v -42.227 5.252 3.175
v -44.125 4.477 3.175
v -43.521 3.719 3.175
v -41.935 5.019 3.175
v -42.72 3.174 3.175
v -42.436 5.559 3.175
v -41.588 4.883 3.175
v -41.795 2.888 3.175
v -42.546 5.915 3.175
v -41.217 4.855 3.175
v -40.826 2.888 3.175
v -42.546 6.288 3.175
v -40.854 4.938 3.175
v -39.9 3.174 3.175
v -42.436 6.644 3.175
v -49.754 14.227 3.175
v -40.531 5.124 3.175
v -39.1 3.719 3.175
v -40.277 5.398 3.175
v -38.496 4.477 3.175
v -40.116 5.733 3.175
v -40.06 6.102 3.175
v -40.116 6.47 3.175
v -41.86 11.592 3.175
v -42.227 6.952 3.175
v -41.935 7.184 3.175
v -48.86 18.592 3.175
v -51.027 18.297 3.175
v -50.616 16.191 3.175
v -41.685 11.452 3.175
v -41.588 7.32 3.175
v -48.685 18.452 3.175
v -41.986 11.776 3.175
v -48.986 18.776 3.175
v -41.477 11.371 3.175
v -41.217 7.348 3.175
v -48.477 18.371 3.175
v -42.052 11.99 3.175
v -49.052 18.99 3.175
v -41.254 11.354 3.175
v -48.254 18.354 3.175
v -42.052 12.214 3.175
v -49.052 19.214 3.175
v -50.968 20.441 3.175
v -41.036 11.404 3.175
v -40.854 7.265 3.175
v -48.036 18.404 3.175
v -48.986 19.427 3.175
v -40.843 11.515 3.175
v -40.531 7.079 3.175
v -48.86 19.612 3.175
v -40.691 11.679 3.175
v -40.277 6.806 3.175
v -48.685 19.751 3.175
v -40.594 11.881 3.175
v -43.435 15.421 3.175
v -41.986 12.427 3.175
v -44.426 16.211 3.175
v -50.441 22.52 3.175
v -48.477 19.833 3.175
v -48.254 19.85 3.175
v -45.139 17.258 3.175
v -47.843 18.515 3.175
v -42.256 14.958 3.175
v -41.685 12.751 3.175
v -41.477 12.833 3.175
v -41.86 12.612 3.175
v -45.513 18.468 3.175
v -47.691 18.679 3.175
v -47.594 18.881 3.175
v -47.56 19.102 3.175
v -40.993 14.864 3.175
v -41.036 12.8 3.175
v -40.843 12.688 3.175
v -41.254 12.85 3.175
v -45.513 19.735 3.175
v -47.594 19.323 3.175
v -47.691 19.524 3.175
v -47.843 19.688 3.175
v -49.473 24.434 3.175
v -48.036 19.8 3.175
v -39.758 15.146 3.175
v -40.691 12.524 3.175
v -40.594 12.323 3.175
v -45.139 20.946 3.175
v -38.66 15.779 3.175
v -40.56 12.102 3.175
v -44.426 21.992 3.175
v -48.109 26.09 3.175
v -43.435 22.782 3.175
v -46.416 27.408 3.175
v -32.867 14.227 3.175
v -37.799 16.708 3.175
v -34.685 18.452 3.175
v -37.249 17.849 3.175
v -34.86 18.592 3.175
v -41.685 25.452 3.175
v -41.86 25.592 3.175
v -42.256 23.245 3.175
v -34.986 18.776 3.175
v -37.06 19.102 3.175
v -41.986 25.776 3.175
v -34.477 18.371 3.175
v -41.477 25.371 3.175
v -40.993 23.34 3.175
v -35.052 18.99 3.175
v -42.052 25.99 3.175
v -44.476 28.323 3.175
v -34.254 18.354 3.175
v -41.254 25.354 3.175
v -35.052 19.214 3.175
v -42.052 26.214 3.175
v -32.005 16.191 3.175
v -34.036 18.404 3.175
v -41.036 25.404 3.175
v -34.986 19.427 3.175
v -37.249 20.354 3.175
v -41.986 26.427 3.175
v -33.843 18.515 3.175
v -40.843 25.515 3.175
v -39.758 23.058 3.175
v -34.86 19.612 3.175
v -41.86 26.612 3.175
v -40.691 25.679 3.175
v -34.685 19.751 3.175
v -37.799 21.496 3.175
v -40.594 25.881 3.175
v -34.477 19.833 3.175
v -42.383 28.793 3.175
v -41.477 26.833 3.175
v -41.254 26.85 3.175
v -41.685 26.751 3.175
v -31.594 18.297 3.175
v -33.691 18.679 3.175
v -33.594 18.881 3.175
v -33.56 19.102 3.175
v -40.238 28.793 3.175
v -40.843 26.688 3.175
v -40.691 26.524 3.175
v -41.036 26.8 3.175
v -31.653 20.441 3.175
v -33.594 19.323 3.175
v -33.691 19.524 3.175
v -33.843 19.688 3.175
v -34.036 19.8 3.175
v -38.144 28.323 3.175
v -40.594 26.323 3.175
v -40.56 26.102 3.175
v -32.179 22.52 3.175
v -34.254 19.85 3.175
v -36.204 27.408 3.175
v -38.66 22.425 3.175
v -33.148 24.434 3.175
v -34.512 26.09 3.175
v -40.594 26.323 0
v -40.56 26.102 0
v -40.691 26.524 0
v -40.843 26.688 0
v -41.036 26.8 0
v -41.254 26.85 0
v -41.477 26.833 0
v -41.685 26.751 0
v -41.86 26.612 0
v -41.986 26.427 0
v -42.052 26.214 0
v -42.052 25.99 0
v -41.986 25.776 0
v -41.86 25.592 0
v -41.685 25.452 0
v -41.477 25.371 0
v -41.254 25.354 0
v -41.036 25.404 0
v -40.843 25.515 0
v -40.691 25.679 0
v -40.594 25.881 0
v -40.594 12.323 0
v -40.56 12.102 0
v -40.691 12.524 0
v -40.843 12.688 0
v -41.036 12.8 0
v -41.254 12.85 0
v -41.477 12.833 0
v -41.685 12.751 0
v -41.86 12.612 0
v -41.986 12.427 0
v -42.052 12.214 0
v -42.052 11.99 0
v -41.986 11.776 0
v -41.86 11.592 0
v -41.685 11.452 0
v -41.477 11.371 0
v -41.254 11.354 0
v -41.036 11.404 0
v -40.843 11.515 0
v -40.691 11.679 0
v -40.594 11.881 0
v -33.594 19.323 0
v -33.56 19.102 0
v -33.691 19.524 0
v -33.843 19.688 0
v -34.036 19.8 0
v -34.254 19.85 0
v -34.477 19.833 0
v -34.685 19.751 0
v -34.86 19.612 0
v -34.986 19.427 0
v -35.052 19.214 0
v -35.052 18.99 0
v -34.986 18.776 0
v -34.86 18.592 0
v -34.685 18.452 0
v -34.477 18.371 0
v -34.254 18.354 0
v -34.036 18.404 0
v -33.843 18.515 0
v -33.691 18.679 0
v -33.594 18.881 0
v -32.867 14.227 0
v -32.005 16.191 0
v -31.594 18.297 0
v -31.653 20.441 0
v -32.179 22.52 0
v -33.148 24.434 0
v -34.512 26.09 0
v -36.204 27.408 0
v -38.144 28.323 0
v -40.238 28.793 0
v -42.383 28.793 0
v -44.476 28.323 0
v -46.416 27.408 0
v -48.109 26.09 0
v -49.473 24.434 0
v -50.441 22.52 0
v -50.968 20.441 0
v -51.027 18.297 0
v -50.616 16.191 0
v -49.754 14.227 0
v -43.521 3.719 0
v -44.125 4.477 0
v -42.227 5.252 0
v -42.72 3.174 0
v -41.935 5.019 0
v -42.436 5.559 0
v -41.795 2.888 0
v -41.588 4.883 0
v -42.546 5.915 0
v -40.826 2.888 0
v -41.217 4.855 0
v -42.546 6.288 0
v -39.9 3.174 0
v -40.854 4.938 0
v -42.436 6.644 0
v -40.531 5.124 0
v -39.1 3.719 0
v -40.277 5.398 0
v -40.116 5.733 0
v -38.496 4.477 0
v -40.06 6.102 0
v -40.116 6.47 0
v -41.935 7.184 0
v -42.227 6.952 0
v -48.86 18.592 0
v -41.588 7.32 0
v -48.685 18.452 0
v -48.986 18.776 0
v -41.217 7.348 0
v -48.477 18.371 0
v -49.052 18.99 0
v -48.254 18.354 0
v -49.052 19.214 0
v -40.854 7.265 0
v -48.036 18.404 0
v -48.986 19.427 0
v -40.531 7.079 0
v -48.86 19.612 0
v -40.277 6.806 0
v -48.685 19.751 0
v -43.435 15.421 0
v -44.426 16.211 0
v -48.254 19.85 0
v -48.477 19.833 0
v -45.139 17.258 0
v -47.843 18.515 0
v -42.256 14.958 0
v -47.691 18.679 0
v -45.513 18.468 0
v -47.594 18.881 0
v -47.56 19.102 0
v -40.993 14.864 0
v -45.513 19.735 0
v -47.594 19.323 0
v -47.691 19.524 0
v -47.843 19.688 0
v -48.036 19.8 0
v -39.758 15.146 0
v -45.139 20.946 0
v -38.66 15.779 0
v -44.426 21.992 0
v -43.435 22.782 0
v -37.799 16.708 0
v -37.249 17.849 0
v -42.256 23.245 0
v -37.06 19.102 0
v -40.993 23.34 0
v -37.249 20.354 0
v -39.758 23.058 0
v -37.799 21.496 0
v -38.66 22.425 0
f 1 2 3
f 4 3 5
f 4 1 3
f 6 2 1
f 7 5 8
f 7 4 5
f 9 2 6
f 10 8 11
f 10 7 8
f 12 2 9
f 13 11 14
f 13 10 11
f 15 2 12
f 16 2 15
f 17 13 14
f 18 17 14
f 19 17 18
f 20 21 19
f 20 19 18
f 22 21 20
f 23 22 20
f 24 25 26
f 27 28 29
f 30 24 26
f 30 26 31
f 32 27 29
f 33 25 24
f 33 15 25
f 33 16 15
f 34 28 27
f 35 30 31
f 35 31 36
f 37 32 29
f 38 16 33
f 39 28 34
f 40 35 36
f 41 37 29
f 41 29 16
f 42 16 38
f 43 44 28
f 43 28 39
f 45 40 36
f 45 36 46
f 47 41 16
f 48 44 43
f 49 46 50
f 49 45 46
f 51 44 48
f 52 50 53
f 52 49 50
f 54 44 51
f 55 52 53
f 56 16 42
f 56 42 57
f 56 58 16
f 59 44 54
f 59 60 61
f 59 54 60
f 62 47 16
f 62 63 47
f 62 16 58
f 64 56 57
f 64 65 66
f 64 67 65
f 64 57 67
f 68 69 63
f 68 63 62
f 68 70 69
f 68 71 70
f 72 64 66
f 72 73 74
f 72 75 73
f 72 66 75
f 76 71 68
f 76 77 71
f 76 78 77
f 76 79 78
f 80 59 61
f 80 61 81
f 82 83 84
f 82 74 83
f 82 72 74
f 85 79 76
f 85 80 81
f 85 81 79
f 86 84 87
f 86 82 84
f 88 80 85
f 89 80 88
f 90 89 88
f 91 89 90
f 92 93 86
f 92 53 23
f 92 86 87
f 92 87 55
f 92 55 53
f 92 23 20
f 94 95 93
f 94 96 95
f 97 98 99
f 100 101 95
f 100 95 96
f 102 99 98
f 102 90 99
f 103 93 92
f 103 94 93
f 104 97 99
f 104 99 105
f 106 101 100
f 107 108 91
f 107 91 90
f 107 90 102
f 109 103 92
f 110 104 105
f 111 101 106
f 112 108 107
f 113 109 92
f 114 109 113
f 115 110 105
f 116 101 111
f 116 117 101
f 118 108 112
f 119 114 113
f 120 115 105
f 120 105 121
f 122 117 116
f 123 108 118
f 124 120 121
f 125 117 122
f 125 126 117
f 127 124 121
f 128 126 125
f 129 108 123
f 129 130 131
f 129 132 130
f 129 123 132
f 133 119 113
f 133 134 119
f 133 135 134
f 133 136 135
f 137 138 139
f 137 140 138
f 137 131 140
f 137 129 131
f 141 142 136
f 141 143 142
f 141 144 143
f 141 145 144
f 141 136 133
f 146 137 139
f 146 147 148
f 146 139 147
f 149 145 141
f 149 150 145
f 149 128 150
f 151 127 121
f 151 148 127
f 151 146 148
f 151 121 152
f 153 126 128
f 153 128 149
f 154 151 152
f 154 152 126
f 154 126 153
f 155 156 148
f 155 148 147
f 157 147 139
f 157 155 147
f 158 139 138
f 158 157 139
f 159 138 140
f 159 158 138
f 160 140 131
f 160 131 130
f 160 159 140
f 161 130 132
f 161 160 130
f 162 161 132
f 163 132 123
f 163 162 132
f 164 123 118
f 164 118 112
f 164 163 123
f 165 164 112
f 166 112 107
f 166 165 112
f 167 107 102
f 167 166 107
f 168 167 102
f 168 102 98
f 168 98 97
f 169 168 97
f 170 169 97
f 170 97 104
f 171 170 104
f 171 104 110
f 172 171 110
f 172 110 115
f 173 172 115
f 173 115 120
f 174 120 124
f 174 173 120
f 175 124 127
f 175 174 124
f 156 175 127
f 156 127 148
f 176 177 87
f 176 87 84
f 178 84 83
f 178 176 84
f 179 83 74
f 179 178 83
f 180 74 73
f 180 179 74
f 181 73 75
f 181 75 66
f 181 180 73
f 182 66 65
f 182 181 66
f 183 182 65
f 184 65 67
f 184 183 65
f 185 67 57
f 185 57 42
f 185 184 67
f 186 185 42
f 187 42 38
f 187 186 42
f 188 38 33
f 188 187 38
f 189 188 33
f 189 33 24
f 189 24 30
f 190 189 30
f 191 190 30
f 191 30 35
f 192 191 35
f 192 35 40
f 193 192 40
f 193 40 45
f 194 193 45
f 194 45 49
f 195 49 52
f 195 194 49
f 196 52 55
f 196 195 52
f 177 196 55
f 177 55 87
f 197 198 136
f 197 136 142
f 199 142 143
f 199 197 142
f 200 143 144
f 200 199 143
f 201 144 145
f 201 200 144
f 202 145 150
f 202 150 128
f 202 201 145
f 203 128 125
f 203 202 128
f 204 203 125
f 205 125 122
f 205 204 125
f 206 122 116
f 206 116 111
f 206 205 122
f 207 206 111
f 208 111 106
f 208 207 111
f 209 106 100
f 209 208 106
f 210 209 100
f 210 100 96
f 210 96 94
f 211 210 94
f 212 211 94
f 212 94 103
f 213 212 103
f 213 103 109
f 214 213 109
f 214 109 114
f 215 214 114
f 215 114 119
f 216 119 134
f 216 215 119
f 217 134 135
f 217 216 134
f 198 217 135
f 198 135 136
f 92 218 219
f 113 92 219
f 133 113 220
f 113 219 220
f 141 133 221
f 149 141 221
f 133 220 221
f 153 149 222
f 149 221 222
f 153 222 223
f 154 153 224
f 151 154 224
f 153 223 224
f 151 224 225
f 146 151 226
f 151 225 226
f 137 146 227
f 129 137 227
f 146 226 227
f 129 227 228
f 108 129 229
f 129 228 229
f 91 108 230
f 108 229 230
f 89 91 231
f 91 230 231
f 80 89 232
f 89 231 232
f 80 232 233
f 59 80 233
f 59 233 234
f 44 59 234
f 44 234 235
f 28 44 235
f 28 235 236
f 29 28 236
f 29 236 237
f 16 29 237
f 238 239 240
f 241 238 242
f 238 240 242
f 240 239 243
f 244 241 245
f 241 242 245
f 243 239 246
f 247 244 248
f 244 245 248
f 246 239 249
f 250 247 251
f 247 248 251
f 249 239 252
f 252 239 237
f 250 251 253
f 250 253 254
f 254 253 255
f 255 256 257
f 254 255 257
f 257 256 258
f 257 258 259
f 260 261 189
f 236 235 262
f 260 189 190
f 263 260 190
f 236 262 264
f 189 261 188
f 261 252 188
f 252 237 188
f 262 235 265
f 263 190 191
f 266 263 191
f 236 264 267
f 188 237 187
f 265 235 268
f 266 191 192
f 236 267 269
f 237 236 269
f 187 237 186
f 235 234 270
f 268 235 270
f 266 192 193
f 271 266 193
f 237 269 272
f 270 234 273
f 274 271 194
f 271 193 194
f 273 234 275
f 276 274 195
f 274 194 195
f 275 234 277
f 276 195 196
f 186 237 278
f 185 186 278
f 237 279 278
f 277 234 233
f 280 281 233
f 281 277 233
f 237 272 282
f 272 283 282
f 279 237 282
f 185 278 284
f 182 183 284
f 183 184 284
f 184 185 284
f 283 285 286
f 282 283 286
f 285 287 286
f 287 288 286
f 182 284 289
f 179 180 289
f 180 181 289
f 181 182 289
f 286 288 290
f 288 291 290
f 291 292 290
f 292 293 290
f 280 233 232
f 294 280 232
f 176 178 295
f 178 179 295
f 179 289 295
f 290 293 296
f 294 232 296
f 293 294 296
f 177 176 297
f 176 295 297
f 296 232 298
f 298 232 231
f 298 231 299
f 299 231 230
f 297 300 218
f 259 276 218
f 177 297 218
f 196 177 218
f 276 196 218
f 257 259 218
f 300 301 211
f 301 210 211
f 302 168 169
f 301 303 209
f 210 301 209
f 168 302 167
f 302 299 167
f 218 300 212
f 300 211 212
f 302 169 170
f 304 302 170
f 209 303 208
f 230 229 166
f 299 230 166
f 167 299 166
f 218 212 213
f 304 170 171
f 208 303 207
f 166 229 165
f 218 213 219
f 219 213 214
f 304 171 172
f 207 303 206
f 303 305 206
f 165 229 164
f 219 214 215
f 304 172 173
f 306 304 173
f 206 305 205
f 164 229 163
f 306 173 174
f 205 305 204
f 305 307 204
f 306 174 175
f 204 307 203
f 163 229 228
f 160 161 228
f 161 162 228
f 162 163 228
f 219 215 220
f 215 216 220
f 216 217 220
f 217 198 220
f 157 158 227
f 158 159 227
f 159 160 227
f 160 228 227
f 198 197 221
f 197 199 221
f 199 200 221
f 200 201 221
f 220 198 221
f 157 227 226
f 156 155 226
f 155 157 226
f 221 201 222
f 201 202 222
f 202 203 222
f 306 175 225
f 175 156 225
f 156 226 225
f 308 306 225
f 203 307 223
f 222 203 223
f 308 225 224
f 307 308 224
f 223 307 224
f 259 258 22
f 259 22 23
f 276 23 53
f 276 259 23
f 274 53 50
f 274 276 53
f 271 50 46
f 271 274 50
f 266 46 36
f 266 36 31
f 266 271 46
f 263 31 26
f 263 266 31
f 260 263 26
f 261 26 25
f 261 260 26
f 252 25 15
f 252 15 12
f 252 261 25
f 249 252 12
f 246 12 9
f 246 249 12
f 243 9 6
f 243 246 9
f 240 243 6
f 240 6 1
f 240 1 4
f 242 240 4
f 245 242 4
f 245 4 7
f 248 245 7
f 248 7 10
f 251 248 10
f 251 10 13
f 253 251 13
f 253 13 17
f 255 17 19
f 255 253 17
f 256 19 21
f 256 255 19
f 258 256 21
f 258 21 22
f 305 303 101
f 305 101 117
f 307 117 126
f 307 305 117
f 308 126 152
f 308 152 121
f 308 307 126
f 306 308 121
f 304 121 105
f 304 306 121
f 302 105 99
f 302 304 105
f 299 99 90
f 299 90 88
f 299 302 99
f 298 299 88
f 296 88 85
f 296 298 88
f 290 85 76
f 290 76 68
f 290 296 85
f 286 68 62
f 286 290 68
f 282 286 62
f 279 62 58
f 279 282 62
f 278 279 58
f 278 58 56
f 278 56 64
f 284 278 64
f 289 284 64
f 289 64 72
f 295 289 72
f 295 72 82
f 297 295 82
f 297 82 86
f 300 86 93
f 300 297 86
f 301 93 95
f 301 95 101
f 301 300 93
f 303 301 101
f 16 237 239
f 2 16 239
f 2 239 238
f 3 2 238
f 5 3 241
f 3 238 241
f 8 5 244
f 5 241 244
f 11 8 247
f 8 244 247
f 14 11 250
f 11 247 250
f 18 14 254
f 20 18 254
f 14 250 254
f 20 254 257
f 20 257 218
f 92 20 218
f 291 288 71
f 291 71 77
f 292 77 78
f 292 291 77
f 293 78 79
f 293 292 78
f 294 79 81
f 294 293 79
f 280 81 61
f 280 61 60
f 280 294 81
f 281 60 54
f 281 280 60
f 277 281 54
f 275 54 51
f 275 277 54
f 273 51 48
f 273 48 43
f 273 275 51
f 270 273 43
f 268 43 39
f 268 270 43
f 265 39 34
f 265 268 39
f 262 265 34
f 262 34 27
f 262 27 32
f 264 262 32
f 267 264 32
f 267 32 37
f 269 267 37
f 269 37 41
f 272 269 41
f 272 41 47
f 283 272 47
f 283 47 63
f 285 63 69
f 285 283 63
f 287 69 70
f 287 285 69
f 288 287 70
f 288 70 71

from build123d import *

# Parameters (mm, degrees)
F0_R     = 1.25
F0_R_2   = 0.75
F0_R_3   = 4.25
F1_DEPTH = 3.175


# Not quite as in the source:
# - a length typed as a fraction of an inch, garbled in the dataset ("3 / 203.2 mm" for 3/8 in), is restored


with BuildPart() as f1:
    # F0 (on Top) → F1 (new body)
    with BuildSketch(Plane.XY):
        with BuildLine():
            Line((-38.4956756474, 4.4767191038), (-32.8665105228, 14.2267191038))
            ThreePointArc((-32.8665105228, 14.2267191038), (-41.3102582097, 28.8517191038), (-49.7540058966, 14.2267191038))
            Line((-49.7540058966, 14.2267191038), (-44.124840772, 4.4767191038))
            ThreePointArc((-44.124840772, 4.4767191038), (-41.3102582097, 2.8517191038), (-38.4956756474, 4.4767191038))
        make_face()
        with Locations((-41.3102582097, 6.1017191038)):
            Circle(F0_R, mode=Mode.SUBTRACT)
        with Locations((-41.3102582097, 12.1017191038)):
            Circle(F0_R_2, mode=Mode.SUBTRACT)
        with Locations((-48.3102582097, 19.1017191038)):
            Circle(F0_R_2, mode=Mode.SUBTRACT)
        with Locations((-41.3102582097, 19.1017191038)):
            Circle(F0_R_3, mode=Mode.SUBTRACT)
        with Locations((-34.3102582097, 19.1017191038)):
            Circle(F0_R_2, mode=Mode.SUBTRACT)
        with Locations((-41.3102582097, 26.1017191038)):
            Circle(F0_R_2, mode=Mode.SUBTRACT)
    extrude(amount=F1_DEPTH)


solid = f1.part
